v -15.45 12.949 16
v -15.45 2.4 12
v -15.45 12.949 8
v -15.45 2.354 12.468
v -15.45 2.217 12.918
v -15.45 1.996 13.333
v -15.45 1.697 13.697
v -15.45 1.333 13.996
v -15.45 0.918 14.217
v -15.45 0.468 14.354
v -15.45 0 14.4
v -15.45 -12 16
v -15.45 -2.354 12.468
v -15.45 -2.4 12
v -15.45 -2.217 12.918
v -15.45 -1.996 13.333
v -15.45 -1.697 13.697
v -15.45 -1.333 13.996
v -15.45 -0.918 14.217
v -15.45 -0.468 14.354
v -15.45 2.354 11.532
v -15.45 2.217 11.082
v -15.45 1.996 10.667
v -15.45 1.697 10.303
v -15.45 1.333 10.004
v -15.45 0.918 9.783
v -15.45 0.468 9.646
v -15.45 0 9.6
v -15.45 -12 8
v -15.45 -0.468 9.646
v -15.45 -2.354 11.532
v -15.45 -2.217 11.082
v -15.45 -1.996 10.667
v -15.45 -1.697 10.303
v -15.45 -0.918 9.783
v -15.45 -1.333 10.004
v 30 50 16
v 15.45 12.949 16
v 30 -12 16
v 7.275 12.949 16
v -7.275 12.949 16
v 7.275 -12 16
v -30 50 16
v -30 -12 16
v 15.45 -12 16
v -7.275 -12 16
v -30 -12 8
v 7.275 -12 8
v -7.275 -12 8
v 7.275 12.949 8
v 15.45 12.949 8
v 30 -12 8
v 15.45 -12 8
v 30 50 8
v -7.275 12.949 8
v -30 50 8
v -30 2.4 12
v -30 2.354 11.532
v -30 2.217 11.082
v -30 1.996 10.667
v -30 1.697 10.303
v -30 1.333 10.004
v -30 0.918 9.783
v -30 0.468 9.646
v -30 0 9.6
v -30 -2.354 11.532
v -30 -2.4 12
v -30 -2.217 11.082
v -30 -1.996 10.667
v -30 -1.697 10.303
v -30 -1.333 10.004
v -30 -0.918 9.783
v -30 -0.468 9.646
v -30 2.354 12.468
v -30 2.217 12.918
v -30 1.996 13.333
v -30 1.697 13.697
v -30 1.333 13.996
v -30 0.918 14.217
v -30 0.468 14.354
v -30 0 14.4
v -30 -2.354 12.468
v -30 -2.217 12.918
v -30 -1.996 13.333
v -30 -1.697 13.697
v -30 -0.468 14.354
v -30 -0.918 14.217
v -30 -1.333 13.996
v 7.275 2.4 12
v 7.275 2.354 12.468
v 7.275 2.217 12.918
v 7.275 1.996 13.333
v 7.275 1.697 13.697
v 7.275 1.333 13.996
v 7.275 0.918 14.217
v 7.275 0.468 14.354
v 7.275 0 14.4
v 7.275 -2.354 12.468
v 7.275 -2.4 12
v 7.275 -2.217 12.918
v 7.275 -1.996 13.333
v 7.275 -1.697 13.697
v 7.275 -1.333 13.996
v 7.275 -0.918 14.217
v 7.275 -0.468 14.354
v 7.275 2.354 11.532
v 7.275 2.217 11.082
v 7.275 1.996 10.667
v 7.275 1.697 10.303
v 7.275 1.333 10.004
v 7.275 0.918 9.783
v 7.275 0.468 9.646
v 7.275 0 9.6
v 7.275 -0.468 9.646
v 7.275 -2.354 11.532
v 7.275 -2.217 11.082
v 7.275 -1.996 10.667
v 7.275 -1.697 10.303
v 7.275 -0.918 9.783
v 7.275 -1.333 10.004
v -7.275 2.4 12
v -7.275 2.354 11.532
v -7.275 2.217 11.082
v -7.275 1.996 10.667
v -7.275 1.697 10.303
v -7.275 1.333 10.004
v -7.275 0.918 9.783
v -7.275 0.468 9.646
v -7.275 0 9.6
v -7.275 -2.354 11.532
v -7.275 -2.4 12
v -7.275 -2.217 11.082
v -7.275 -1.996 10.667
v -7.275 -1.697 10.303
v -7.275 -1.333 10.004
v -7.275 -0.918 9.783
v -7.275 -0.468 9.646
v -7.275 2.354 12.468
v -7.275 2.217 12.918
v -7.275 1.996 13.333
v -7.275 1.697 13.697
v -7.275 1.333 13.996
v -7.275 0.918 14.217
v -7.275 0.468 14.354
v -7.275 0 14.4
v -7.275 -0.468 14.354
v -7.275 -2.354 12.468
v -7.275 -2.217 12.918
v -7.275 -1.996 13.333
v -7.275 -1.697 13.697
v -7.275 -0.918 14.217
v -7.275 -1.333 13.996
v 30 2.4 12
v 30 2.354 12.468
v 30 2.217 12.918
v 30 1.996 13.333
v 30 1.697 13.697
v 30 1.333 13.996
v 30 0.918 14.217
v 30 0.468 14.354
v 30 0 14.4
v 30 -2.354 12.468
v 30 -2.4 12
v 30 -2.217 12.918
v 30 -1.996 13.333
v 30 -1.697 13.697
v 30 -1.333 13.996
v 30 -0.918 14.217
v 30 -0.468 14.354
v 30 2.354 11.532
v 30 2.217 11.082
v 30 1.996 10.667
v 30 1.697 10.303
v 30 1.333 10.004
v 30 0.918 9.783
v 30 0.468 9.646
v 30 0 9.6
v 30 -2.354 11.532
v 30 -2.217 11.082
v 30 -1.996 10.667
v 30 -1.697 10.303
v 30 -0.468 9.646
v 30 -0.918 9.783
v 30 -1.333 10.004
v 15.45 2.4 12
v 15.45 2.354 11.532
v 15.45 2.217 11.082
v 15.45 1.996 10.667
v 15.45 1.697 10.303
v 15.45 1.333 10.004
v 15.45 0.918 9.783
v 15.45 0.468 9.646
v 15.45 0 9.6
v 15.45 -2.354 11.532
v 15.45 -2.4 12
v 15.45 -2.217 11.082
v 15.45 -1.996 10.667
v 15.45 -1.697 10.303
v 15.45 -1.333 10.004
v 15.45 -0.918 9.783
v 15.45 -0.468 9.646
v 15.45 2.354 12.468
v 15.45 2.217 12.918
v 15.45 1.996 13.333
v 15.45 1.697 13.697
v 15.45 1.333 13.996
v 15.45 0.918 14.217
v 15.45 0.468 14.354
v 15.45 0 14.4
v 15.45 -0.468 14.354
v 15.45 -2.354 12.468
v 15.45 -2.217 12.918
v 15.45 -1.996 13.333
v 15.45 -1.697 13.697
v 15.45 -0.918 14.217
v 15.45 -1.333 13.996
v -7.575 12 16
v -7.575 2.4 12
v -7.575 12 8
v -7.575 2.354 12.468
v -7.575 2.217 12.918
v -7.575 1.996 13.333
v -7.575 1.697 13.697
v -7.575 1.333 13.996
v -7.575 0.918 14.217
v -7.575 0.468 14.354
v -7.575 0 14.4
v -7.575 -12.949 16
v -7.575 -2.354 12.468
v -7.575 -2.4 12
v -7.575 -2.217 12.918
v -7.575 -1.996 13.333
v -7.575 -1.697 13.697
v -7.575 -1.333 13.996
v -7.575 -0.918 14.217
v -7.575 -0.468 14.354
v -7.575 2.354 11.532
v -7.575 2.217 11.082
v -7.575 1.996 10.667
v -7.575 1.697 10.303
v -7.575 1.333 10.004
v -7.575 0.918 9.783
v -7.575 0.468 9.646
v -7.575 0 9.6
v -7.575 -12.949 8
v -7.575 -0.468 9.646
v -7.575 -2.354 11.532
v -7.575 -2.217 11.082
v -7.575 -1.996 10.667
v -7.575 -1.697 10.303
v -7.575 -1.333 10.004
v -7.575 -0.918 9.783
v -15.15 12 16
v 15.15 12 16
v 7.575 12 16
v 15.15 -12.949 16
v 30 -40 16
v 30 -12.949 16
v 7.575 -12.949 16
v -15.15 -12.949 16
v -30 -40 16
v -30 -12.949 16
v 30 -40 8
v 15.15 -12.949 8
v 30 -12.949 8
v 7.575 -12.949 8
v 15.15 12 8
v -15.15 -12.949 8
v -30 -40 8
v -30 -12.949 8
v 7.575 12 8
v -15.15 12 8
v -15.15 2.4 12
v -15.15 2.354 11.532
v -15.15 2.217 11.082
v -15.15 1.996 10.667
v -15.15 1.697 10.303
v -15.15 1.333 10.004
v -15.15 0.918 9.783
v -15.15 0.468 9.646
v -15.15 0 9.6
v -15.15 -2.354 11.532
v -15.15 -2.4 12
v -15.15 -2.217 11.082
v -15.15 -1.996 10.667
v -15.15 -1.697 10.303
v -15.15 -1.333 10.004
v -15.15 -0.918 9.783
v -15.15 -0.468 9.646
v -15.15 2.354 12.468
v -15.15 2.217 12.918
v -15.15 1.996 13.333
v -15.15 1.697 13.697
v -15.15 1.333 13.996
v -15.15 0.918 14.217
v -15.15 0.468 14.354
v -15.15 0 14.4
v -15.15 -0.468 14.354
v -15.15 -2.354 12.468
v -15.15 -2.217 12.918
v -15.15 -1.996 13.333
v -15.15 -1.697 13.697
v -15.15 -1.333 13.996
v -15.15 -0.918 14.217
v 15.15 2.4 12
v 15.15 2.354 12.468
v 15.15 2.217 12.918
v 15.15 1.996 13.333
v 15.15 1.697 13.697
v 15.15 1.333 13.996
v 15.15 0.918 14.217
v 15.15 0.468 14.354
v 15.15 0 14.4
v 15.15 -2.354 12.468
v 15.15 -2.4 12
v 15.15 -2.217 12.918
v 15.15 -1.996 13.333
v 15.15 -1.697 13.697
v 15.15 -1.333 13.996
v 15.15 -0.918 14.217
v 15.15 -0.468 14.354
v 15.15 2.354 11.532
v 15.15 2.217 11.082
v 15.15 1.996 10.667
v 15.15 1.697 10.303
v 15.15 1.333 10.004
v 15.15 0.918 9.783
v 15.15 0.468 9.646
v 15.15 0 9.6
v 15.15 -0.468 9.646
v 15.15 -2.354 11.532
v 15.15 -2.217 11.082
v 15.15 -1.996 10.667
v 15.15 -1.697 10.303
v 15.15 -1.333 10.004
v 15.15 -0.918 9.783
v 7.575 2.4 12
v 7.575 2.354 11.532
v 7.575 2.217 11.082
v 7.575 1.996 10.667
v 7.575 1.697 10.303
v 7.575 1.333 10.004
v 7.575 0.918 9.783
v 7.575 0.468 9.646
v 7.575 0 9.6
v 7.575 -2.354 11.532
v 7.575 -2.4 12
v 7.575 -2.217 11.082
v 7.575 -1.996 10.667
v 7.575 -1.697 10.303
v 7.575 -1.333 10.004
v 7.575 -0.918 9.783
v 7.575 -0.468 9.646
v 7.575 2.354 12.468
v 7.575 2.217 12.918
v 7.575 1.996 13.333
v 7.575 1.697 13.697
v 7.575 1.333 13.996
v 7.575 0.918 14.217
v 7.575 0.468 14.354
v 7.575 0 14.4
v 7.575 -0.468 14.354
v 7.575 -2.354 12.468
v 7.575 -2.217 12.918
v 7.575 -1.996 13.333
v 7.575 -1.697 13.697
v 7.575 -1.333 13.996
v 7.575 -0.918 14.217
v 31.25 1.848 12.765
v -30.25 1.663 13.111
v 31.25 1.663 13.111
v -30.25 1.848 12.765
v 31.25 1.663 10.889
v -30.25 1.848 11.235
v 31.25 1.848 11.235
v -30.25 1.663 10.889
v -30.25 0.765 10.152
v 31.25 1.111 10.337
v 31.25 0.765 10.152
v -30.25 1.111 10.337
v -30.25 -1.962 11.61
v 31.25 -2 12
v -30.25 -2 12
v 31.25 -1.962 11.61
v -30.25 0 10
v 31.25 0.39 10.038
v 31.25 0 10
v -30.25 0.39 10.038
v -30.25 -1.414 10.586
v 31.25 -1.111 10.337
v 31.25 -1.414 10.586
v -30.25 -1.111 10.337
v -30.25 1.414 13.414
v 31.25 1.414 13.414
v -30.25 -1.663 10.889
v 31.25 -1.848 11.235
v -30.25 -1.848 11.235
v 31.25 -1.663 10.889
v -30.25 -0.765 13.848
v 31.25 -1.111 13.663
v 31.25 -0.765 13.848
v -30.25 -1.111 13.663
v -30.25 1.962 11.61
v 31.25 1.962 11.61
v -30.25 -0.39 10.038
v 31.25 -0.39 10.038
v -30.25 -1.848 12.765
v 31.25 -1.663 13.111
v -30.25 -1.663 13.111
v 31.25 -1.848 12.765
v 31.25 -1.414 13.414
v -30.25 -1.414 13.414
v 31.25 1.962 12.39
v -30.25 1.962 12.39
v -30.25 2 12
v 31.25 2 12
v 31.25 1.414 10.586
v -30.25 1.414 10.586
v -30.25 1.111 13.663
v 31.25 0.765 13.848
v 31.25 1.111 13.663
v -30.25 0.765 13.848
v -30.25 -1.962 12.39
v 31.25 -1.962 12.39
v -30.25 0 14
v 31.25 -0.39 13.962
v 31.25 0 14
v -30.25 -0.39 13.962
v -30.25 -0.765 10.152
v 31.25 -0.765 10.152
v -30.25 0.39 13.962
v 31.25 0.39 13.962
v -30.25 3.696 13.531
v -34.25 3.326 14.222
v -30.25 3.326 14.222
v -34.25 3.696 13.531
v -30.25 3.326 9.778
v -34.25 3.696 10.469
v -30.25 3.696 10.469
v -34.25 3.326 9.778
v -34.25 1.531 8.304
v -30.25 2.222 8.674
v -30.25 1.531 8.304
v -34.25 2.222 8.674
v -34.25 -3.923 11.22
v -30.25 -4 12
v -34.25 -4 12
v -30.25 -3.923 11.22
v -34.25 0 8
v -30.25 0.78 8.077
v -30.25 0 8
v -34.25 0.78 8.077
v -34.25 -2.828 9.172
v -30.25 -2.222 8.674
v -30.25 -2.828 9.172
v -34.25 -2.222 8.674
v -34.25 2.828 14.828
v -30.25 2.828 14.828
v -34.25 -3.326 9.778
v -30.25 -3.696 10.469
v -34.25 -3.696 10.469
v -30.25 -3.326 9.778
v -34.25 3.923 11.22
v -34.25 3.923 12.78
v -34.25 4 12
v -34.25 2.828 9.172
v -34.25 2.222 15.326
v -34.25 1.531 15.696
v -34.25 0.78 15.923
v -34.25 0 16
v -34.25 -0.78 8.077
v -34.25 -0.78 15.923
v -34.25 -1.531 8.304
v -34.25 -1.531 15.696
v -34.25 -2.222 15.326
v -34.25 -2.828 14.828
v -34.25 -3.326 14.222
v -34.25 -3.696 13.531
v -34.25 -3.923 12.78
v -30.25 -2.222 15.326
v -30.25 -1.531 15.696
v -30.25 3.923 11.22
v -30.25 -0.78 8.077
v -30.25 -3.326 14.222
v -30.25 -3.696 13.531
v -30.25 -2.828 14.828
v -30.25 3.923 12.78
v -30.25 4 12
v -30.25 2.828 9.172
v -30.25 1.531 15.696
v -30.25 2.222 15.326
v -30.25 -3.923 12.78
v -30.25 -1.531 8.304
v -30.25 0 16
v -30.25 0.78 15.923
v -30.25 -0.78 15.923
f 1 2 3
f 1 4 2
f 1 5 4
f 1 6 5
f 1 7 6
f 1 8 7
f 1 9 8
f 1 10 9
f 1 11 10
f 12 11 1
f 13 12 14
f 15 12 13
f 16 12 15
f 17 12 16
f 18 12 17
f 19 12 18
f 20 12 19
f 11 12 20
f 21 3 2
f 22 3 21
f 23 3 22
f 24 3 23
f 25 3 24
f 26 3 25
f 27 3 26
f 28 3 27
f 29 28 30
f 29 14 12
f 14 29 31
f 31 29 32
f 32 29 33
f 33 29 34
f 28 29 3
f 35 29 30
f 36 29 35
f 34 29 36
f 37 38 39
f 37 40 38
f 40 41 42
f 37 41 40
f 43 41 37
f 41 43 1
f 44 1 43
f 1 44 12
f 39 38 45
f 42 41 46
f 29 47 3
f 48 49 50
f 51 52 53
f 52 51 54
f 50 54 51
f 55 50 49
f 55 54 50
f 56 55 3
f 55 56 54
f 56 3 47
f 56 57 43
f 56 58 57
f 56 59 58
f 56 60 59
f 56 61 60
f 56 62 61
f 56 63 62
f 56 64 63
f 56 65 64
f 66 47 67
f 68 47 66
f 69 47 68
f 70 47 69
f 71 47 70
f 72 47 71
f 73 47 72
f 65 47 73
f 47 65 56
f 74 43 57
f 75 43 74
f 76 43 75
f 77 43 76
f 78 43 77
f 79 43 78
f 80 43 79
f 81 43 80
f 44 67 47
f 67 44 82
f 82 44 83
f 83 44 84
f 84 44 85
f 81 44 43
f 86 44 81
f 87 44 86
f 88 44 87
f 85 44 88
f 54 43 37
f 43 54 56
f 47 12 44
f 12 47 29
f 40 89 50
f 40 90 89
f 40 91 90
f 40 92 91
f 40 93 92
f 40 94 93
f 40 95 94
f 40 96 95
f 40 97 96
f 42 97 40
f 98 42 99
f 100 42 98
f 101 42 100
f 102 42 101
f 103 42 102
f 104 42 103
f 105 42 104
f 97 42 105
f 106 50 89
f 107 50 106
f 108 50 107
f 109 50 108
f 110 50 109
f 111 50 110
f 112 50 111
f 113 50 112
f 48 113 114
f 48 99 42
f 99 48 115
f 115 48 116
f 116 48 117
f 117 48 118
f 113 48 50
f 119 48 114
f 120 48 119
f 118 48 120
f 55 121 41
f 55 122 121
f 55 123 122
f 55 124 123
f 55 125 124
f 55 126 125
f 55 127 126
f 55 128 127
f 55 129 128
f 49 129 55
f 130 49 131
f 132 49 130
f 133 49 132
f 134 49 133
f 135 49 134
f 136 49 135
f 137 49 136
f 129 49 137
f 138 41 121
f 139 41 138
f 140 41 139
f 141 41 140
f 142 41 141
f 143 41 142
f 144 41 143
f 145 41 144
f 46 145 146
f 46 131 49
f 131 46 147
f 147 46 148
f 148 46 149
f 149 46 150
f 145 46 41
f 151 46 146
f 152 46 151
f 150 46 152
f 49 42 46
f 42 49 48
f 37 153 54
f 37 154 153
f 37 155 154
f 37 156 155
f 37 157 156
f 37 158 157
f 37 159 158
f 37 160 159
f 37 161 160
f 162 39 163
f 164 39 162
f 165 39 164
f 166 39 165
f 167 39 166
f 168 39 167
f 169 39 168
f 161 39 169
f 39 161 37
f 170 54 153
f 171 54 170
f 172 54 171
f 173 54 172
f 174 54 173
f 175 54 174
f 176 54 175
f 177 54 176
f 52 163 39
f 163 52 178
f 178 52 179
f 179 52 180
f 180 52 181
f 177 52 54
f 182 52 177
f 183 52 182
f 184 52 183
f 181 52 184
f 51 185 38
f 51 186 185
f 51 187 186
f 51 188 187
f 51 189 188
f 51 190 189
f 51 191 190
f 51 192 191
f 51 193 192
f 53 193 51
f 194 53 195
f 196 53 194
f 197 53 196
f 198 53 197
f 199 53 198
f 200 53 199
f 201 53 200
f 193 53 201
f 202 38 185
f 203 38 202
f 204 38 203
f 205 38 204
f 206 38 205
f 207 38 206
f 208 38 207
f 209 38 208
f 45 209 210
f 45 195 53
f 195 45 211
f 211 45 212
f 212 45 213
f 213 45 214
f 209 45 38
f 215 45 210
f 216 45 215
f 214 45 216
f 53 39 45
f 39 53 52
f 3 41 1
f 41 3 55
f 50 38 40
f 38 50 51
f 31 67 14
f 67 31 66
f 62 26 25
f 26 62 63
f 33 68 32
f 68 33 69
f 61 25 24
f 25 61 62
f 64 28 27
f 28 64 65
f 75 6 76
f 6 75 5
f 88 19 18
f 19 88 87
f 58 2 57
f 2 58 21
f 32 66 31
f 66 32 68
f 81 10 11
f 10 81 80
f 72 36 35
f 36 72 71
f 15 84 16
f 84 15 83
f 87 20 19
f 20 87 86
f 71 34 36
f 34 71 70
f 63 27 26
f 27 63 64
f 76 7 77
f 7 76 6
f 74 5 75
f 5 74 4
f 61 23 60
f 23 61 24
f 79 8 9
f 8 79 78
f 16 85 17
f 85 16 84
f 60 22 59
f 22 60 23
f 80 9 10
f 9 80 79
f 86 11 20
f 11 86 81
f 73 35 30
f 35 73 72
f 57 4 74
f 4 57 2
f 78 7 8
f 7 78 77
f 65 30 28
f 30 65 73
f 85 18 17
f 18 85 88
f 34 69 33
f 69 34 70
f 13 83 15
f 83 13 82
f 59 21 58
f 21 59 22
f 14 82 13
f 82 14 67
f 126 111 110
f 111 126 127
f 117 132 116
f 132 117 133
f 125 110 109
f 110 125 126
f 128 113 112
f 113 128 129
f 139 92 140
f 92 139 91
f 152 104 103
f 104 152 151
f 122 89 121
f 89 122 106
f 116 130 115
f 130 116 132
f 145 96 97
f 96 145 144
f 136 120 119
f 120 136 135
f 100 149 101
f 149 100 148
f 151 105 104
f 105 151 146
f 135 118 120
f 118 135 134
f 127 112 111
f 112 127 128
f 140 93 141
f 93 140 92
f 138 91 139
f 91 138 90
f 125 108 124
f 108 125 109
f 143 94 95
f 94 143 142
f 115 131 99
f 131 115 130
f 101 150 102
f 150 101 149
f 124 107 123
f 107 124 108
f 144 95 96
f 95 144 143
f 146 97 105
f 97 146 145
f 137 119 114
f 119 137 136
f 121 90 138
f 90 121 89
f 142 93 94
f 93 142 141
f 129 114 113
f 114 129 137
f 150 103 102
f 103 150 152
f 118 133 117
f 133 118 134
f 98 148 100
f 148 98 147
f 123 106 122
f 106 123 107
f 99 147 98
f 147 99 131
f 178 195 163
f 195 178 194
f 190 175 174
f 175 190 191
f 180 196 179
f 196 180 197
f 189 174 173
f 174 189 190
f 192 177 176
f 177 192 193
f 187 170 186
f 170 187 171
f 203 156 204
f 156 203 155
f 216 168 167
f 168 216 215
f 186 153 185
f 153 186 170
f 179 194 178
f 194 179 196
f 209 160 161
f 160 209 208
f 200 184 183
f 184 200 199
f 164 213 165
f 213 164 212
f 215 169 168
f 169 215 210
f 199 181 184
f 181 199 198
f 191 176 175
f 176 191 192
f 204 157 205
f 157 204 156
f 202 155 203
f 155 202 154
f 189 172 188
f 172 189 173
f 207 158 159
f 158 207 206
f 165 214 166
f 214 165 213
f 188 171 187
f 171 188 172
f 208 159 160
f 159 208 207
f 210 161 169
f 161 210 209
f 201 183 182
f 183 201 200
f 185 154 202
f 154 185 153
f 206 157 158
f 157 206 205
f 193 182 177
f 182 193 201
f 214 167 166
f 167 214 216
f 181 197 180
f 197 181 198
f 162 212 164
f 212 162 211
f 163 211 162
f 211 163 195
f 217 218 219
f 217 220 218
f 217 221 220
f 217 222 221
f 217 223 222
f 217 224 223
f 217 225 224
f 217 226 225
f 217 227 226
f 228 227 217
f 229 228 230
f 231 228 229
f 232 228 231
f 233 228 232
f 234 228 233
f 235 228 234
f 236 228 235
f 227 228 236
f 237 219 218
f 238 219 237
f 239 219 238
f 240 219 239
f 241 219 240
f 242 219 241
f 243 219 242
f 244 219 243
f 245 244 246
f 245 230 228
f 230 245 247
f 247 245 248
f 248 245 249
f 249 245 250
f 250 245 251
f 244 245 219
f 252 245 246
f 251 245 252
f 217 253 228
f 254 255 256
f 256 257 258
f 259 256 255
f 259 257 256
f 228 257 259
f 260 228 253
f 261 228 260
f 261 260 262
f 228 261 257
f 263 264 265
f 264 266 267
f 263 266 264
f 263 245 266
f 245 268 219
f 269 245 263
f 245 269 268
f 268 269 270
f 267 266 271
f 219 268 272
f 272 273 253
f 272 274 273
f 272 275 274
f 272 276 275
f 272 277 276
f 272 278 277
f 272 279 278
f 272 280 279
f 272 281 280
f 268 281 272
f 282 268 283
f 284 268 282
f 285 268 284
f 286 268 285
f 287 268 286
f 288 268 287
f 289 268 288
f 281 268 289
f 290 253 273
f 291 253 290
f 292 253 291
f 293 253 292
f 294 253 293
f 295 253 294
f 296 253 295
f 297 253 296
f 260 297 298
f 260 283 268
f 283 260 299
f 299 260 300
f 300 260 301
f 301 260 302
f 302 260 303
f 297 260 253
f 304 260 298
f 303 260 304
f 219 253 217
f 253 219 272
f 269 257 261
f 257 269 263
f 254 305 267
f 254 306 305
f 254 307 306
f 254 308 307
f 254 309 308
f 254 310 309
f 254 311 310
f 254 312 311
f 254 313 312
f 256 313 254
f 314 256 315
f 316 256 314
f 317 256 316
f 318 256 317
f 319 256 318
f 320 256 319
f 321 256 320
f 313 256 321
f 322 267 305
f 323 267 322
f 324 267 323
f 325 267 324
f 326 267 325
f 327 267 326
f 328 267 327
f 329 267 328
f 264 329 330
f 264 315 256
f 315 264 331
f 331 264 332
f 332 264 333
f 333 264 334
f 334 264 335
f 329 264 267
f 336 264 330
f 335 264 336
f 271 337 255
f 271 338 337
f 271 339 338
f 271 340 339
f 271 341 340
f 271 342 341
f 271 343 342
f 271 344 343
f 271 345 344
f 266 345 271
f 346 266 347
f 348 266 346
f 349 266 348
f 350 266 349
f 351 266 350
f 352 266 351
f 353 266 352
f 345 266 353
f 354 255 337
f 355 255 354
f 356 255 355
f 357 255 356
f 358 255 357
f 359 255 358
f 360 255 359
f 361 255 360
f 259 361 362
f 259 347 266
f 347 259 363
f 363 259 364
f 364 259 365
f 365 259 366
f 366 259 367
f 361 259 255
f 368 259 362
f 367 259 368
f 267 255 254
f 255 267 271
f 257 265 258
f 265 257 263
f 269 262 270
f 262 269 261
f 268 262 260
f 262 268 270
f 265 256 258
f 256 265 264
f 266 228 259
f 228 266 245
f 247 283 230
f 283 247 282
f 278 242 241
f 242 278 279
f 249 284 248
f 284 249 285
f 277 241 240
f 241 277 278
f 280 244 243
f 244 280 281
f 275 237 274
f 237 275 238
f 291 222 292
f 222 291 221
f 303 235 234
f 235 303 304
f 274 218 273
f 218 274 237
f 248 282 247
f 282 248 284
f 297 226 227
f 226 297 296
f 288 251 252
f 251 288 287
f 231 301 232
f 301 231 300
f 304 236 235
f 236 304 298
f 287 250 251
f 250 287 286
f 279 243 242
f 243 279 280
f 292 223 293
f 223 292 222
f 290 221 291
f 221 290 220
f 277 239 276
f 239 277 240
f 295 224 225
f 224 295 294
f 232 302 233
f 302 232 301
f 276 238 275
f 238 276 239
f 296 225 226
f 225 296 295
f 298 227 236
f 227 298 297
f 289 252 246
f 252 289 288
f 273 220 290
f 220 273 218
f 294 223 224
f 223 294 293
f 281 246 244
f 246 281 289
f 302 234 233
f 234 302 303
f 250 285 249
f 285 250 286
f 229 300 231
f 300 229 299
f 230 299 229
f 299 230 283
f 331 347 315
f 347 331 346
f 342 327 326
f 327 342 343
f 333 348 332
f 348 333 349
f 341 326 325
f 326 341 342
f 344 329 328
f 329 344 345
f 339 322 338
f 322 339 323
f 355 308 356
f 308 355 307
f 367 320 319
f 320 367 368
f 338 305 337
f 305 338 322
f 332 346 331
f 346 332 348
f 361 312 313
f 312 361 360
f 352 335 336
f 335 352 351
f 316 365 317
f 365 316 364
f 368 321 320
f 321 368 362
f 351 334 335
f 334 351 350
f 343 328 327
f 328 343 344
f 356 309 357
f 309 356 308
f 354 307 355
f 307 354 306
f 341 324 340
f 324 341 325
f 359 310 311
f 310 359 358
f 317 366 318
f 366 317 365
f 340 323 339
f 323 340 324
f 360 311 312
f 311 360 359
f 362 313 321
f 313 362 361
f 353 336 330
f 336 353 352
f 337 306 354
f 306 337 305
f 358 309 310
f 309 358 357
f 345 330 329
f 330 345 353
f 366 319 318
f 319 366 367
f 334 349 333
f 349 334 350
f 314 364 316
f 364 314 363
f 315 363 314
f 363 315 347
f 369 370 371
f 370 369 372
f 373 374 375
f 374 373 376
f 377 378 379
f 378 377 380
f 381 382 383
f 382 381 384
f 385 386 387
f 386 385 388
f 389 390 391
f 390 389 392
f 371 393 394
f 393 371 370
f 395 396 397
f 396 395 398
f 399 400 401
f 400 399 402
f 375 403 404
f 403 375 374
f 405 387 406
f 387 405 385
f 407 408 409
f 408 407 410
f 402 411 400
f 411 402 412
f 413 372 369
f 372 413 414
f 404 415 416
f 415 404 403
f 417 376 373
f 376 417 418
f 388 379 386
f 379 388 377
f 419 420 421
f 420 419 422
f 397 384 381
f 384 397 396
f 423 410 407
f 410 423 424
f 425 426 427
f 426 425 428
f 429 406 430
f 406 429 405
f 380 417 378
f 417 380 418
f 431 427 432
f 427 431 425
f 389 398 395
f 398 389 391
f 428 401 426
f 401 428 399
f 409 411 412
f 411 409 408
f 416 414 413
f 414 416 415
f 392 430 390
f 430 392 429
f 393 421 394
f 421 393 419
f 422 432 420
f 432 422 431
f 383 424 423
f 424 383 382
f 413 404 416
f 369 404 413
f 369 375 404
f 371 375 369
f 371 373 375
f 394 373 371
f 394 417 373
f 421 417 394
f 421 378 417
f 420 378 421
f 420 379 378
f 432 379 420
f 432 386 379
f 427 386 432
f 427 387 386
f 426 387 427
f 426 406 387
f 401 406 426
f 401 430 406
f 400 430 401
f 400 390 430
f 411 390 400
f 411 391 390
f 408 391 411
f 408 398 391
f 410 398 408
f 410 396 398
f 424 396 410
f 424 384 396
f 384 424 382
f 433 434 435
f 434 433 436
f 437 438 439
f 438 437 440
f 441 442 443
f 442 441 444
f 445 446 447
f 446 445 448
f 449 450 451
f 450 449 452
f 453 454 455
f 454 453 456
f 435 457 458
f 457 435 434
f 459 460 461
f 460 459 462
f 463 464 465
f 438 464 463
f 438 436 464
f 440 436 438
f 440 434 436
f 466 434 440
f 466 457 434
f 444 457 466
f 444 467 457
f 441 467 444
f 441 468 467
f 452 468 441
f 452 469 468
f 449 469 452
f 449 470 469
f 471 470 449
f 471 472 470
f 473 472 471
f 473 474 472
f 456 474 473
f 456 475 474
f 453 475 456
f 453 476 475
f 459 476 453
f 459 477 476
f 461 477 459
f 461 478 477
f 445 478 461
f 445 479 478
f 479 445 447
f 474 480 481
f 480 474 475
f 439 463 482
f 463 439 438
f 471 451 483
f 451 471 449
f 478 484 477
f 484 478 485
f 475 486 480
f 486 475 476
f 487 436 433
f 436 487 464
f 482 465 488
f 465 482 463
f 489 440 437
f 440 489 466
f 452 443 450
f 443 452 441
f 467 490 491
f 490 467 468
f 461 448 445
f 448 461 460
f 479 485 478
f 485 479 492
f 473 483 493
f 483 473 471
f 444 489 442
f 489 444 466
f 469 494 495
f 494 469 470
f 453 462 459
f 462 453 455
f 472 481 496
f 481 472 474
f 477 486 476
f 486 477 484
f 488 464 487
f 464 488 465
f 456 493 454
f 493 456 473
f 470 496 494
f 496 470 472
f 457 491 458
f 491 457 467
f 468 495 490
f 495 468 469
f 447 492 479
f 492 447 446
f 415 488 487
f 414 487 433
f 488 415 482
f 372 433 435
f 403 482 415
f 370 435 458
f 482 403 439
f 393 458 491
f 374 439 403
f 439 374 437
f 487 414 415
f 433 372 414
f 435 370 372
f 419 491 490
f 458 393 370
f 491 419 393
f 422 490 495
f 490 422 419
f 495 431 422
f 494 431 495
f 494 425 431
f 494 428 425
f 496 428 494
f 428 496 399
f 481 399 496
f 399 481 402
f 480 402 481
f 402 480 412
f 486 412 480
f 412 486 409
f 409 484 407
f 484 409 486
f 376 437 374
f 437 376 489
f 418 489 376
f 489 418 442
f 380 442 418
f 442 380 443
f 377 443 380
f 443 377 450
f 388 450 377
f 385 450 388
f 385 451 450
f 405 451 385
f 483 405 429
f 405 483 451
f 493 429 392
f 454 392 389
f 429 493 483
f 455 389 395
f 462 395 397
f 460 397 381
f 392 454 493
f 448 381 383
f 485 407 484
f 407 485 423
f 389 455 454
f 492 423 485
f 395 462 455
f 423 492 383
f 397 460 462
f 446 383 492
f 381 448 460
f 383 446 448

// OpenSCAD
$fn = 32;

// ------------------------------------------------------------------------
// Butt hinge: hinge 60 mm, leaf swung 0 deg
// Every part is its own module, assembly() places every instance.
// ------------------------------------------------------------------------

// --- part 1 ---
module hinge_base() {
  difference() {
    union() {
      translate([-30, -12, -4]) cube([14.55, 62, 8]);
      translate([-7.275, -12, -4]) cube([14.55, 62, 8]);
      translate([15.45, -12, -4]) cube([14.55, 62, 8]);
      translate([-30, 12.949, -4]) cube([60, 37.051, 8]);
    }
    translate([-22.725, 0, 0]) rotate([0, 90, 0]) cylinder(h = 16.55, d = 4.8, center = true);
    translate([0, 0, 0]) rotate([0, 90, 0]) cylinder(h = 16.55, d = 4.8, center = true);
    translate([22.725, 0, 0]) rotate([0, 90, 0]) cylinder(h = 16.55, d = 4.8, center = true);
  }
}

// --- part 2 ---
module hinge_mover() {
  difference() {
    union() {
      translate([-15.15, -40, -4]) cube([7.575, 52, 8]);
      translate([7.575, -40, -4]) cube([7.575, 52, 8]);
      translate([-30, -40, -4]) cube([60, 27.051, 8]);
    }
    translate([-11.362, 0, 0]) rotate([0, 90, 0]) cylinder(h = 9.575, d = 4.8, center = true);
    translate([11.362, 0, 0]) rotate([0, 90, 0]) cylinder(h = 9.575, d = 4.8, center = true);
  }
}

// --- part 3 ---
module hinge_pin() {
  rotate([0, 90, 0]) cylinder(h = 62.5, d = 4, center = true);
  translate([-34.25, 0, 0]) rotate([0, 90, 0]) cylinder(h = 4, d = 8);
}

// --- assembly ---
module assembly() {
  color([0.80, 0.24, 0.20]) translate([0, 0, 12]) rotate([0, 0, 0]) hinge_base();
  color([0.20, 0.45, 0.75]) translate([0, 0, 12]) rotate([0, 0, 0]) hinge_mover();
  color([0.25, 0.62, 0.32]) translate([0, 0, 12]) rotate([0, 0, 0]) hinge_pin();
}

assembly();
